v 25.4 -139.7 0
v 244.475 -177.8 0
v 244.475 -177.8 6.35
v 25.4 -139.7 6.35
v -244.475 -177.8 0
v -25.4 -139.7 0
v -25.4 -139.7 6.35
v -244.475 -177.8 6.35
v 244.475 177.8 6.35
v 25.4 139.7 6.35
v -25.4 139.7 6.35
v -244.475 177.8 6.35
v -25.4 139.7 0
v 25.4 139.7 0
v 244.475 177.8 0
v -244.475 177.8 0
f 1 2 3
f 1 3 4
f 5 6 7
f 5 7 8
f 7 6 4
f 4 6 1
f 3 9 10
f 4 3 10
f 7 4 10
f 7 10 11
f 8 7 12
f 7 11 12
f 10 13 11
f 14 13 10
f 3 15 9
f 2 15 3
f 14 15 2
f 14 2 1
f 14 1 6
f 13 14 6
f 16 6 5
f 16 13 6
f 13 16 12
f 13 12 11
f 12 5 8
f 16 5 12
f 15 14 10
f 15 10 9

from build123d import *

# Parameters (mm, degrees)
SKETCH2_W           = 50.8
SKETCH2_H           = 279.4
BOSS_EXTRUDE2_DEPTH = 6.35


with BuildPart() as part:
    # Sketch2 → Boss-Extrude2 (new body)
    with BuildSketch(Plane.XY):
        Polygon((-25.4, -139.7), (-244.475, -177.8), (-244.475, 177.8), (-25.4, 139.7), align=None)
        Rectangle(SKETCH2_W, SKETCH2_H)
        Polygon((25.4, -139.7), (25.4, 139.7), (244.475, 177.8), (244.475, -177.8), align=None)
    extrude(amount=BOSS_EXTRUDE2_DEPTH)


solid = part.part
